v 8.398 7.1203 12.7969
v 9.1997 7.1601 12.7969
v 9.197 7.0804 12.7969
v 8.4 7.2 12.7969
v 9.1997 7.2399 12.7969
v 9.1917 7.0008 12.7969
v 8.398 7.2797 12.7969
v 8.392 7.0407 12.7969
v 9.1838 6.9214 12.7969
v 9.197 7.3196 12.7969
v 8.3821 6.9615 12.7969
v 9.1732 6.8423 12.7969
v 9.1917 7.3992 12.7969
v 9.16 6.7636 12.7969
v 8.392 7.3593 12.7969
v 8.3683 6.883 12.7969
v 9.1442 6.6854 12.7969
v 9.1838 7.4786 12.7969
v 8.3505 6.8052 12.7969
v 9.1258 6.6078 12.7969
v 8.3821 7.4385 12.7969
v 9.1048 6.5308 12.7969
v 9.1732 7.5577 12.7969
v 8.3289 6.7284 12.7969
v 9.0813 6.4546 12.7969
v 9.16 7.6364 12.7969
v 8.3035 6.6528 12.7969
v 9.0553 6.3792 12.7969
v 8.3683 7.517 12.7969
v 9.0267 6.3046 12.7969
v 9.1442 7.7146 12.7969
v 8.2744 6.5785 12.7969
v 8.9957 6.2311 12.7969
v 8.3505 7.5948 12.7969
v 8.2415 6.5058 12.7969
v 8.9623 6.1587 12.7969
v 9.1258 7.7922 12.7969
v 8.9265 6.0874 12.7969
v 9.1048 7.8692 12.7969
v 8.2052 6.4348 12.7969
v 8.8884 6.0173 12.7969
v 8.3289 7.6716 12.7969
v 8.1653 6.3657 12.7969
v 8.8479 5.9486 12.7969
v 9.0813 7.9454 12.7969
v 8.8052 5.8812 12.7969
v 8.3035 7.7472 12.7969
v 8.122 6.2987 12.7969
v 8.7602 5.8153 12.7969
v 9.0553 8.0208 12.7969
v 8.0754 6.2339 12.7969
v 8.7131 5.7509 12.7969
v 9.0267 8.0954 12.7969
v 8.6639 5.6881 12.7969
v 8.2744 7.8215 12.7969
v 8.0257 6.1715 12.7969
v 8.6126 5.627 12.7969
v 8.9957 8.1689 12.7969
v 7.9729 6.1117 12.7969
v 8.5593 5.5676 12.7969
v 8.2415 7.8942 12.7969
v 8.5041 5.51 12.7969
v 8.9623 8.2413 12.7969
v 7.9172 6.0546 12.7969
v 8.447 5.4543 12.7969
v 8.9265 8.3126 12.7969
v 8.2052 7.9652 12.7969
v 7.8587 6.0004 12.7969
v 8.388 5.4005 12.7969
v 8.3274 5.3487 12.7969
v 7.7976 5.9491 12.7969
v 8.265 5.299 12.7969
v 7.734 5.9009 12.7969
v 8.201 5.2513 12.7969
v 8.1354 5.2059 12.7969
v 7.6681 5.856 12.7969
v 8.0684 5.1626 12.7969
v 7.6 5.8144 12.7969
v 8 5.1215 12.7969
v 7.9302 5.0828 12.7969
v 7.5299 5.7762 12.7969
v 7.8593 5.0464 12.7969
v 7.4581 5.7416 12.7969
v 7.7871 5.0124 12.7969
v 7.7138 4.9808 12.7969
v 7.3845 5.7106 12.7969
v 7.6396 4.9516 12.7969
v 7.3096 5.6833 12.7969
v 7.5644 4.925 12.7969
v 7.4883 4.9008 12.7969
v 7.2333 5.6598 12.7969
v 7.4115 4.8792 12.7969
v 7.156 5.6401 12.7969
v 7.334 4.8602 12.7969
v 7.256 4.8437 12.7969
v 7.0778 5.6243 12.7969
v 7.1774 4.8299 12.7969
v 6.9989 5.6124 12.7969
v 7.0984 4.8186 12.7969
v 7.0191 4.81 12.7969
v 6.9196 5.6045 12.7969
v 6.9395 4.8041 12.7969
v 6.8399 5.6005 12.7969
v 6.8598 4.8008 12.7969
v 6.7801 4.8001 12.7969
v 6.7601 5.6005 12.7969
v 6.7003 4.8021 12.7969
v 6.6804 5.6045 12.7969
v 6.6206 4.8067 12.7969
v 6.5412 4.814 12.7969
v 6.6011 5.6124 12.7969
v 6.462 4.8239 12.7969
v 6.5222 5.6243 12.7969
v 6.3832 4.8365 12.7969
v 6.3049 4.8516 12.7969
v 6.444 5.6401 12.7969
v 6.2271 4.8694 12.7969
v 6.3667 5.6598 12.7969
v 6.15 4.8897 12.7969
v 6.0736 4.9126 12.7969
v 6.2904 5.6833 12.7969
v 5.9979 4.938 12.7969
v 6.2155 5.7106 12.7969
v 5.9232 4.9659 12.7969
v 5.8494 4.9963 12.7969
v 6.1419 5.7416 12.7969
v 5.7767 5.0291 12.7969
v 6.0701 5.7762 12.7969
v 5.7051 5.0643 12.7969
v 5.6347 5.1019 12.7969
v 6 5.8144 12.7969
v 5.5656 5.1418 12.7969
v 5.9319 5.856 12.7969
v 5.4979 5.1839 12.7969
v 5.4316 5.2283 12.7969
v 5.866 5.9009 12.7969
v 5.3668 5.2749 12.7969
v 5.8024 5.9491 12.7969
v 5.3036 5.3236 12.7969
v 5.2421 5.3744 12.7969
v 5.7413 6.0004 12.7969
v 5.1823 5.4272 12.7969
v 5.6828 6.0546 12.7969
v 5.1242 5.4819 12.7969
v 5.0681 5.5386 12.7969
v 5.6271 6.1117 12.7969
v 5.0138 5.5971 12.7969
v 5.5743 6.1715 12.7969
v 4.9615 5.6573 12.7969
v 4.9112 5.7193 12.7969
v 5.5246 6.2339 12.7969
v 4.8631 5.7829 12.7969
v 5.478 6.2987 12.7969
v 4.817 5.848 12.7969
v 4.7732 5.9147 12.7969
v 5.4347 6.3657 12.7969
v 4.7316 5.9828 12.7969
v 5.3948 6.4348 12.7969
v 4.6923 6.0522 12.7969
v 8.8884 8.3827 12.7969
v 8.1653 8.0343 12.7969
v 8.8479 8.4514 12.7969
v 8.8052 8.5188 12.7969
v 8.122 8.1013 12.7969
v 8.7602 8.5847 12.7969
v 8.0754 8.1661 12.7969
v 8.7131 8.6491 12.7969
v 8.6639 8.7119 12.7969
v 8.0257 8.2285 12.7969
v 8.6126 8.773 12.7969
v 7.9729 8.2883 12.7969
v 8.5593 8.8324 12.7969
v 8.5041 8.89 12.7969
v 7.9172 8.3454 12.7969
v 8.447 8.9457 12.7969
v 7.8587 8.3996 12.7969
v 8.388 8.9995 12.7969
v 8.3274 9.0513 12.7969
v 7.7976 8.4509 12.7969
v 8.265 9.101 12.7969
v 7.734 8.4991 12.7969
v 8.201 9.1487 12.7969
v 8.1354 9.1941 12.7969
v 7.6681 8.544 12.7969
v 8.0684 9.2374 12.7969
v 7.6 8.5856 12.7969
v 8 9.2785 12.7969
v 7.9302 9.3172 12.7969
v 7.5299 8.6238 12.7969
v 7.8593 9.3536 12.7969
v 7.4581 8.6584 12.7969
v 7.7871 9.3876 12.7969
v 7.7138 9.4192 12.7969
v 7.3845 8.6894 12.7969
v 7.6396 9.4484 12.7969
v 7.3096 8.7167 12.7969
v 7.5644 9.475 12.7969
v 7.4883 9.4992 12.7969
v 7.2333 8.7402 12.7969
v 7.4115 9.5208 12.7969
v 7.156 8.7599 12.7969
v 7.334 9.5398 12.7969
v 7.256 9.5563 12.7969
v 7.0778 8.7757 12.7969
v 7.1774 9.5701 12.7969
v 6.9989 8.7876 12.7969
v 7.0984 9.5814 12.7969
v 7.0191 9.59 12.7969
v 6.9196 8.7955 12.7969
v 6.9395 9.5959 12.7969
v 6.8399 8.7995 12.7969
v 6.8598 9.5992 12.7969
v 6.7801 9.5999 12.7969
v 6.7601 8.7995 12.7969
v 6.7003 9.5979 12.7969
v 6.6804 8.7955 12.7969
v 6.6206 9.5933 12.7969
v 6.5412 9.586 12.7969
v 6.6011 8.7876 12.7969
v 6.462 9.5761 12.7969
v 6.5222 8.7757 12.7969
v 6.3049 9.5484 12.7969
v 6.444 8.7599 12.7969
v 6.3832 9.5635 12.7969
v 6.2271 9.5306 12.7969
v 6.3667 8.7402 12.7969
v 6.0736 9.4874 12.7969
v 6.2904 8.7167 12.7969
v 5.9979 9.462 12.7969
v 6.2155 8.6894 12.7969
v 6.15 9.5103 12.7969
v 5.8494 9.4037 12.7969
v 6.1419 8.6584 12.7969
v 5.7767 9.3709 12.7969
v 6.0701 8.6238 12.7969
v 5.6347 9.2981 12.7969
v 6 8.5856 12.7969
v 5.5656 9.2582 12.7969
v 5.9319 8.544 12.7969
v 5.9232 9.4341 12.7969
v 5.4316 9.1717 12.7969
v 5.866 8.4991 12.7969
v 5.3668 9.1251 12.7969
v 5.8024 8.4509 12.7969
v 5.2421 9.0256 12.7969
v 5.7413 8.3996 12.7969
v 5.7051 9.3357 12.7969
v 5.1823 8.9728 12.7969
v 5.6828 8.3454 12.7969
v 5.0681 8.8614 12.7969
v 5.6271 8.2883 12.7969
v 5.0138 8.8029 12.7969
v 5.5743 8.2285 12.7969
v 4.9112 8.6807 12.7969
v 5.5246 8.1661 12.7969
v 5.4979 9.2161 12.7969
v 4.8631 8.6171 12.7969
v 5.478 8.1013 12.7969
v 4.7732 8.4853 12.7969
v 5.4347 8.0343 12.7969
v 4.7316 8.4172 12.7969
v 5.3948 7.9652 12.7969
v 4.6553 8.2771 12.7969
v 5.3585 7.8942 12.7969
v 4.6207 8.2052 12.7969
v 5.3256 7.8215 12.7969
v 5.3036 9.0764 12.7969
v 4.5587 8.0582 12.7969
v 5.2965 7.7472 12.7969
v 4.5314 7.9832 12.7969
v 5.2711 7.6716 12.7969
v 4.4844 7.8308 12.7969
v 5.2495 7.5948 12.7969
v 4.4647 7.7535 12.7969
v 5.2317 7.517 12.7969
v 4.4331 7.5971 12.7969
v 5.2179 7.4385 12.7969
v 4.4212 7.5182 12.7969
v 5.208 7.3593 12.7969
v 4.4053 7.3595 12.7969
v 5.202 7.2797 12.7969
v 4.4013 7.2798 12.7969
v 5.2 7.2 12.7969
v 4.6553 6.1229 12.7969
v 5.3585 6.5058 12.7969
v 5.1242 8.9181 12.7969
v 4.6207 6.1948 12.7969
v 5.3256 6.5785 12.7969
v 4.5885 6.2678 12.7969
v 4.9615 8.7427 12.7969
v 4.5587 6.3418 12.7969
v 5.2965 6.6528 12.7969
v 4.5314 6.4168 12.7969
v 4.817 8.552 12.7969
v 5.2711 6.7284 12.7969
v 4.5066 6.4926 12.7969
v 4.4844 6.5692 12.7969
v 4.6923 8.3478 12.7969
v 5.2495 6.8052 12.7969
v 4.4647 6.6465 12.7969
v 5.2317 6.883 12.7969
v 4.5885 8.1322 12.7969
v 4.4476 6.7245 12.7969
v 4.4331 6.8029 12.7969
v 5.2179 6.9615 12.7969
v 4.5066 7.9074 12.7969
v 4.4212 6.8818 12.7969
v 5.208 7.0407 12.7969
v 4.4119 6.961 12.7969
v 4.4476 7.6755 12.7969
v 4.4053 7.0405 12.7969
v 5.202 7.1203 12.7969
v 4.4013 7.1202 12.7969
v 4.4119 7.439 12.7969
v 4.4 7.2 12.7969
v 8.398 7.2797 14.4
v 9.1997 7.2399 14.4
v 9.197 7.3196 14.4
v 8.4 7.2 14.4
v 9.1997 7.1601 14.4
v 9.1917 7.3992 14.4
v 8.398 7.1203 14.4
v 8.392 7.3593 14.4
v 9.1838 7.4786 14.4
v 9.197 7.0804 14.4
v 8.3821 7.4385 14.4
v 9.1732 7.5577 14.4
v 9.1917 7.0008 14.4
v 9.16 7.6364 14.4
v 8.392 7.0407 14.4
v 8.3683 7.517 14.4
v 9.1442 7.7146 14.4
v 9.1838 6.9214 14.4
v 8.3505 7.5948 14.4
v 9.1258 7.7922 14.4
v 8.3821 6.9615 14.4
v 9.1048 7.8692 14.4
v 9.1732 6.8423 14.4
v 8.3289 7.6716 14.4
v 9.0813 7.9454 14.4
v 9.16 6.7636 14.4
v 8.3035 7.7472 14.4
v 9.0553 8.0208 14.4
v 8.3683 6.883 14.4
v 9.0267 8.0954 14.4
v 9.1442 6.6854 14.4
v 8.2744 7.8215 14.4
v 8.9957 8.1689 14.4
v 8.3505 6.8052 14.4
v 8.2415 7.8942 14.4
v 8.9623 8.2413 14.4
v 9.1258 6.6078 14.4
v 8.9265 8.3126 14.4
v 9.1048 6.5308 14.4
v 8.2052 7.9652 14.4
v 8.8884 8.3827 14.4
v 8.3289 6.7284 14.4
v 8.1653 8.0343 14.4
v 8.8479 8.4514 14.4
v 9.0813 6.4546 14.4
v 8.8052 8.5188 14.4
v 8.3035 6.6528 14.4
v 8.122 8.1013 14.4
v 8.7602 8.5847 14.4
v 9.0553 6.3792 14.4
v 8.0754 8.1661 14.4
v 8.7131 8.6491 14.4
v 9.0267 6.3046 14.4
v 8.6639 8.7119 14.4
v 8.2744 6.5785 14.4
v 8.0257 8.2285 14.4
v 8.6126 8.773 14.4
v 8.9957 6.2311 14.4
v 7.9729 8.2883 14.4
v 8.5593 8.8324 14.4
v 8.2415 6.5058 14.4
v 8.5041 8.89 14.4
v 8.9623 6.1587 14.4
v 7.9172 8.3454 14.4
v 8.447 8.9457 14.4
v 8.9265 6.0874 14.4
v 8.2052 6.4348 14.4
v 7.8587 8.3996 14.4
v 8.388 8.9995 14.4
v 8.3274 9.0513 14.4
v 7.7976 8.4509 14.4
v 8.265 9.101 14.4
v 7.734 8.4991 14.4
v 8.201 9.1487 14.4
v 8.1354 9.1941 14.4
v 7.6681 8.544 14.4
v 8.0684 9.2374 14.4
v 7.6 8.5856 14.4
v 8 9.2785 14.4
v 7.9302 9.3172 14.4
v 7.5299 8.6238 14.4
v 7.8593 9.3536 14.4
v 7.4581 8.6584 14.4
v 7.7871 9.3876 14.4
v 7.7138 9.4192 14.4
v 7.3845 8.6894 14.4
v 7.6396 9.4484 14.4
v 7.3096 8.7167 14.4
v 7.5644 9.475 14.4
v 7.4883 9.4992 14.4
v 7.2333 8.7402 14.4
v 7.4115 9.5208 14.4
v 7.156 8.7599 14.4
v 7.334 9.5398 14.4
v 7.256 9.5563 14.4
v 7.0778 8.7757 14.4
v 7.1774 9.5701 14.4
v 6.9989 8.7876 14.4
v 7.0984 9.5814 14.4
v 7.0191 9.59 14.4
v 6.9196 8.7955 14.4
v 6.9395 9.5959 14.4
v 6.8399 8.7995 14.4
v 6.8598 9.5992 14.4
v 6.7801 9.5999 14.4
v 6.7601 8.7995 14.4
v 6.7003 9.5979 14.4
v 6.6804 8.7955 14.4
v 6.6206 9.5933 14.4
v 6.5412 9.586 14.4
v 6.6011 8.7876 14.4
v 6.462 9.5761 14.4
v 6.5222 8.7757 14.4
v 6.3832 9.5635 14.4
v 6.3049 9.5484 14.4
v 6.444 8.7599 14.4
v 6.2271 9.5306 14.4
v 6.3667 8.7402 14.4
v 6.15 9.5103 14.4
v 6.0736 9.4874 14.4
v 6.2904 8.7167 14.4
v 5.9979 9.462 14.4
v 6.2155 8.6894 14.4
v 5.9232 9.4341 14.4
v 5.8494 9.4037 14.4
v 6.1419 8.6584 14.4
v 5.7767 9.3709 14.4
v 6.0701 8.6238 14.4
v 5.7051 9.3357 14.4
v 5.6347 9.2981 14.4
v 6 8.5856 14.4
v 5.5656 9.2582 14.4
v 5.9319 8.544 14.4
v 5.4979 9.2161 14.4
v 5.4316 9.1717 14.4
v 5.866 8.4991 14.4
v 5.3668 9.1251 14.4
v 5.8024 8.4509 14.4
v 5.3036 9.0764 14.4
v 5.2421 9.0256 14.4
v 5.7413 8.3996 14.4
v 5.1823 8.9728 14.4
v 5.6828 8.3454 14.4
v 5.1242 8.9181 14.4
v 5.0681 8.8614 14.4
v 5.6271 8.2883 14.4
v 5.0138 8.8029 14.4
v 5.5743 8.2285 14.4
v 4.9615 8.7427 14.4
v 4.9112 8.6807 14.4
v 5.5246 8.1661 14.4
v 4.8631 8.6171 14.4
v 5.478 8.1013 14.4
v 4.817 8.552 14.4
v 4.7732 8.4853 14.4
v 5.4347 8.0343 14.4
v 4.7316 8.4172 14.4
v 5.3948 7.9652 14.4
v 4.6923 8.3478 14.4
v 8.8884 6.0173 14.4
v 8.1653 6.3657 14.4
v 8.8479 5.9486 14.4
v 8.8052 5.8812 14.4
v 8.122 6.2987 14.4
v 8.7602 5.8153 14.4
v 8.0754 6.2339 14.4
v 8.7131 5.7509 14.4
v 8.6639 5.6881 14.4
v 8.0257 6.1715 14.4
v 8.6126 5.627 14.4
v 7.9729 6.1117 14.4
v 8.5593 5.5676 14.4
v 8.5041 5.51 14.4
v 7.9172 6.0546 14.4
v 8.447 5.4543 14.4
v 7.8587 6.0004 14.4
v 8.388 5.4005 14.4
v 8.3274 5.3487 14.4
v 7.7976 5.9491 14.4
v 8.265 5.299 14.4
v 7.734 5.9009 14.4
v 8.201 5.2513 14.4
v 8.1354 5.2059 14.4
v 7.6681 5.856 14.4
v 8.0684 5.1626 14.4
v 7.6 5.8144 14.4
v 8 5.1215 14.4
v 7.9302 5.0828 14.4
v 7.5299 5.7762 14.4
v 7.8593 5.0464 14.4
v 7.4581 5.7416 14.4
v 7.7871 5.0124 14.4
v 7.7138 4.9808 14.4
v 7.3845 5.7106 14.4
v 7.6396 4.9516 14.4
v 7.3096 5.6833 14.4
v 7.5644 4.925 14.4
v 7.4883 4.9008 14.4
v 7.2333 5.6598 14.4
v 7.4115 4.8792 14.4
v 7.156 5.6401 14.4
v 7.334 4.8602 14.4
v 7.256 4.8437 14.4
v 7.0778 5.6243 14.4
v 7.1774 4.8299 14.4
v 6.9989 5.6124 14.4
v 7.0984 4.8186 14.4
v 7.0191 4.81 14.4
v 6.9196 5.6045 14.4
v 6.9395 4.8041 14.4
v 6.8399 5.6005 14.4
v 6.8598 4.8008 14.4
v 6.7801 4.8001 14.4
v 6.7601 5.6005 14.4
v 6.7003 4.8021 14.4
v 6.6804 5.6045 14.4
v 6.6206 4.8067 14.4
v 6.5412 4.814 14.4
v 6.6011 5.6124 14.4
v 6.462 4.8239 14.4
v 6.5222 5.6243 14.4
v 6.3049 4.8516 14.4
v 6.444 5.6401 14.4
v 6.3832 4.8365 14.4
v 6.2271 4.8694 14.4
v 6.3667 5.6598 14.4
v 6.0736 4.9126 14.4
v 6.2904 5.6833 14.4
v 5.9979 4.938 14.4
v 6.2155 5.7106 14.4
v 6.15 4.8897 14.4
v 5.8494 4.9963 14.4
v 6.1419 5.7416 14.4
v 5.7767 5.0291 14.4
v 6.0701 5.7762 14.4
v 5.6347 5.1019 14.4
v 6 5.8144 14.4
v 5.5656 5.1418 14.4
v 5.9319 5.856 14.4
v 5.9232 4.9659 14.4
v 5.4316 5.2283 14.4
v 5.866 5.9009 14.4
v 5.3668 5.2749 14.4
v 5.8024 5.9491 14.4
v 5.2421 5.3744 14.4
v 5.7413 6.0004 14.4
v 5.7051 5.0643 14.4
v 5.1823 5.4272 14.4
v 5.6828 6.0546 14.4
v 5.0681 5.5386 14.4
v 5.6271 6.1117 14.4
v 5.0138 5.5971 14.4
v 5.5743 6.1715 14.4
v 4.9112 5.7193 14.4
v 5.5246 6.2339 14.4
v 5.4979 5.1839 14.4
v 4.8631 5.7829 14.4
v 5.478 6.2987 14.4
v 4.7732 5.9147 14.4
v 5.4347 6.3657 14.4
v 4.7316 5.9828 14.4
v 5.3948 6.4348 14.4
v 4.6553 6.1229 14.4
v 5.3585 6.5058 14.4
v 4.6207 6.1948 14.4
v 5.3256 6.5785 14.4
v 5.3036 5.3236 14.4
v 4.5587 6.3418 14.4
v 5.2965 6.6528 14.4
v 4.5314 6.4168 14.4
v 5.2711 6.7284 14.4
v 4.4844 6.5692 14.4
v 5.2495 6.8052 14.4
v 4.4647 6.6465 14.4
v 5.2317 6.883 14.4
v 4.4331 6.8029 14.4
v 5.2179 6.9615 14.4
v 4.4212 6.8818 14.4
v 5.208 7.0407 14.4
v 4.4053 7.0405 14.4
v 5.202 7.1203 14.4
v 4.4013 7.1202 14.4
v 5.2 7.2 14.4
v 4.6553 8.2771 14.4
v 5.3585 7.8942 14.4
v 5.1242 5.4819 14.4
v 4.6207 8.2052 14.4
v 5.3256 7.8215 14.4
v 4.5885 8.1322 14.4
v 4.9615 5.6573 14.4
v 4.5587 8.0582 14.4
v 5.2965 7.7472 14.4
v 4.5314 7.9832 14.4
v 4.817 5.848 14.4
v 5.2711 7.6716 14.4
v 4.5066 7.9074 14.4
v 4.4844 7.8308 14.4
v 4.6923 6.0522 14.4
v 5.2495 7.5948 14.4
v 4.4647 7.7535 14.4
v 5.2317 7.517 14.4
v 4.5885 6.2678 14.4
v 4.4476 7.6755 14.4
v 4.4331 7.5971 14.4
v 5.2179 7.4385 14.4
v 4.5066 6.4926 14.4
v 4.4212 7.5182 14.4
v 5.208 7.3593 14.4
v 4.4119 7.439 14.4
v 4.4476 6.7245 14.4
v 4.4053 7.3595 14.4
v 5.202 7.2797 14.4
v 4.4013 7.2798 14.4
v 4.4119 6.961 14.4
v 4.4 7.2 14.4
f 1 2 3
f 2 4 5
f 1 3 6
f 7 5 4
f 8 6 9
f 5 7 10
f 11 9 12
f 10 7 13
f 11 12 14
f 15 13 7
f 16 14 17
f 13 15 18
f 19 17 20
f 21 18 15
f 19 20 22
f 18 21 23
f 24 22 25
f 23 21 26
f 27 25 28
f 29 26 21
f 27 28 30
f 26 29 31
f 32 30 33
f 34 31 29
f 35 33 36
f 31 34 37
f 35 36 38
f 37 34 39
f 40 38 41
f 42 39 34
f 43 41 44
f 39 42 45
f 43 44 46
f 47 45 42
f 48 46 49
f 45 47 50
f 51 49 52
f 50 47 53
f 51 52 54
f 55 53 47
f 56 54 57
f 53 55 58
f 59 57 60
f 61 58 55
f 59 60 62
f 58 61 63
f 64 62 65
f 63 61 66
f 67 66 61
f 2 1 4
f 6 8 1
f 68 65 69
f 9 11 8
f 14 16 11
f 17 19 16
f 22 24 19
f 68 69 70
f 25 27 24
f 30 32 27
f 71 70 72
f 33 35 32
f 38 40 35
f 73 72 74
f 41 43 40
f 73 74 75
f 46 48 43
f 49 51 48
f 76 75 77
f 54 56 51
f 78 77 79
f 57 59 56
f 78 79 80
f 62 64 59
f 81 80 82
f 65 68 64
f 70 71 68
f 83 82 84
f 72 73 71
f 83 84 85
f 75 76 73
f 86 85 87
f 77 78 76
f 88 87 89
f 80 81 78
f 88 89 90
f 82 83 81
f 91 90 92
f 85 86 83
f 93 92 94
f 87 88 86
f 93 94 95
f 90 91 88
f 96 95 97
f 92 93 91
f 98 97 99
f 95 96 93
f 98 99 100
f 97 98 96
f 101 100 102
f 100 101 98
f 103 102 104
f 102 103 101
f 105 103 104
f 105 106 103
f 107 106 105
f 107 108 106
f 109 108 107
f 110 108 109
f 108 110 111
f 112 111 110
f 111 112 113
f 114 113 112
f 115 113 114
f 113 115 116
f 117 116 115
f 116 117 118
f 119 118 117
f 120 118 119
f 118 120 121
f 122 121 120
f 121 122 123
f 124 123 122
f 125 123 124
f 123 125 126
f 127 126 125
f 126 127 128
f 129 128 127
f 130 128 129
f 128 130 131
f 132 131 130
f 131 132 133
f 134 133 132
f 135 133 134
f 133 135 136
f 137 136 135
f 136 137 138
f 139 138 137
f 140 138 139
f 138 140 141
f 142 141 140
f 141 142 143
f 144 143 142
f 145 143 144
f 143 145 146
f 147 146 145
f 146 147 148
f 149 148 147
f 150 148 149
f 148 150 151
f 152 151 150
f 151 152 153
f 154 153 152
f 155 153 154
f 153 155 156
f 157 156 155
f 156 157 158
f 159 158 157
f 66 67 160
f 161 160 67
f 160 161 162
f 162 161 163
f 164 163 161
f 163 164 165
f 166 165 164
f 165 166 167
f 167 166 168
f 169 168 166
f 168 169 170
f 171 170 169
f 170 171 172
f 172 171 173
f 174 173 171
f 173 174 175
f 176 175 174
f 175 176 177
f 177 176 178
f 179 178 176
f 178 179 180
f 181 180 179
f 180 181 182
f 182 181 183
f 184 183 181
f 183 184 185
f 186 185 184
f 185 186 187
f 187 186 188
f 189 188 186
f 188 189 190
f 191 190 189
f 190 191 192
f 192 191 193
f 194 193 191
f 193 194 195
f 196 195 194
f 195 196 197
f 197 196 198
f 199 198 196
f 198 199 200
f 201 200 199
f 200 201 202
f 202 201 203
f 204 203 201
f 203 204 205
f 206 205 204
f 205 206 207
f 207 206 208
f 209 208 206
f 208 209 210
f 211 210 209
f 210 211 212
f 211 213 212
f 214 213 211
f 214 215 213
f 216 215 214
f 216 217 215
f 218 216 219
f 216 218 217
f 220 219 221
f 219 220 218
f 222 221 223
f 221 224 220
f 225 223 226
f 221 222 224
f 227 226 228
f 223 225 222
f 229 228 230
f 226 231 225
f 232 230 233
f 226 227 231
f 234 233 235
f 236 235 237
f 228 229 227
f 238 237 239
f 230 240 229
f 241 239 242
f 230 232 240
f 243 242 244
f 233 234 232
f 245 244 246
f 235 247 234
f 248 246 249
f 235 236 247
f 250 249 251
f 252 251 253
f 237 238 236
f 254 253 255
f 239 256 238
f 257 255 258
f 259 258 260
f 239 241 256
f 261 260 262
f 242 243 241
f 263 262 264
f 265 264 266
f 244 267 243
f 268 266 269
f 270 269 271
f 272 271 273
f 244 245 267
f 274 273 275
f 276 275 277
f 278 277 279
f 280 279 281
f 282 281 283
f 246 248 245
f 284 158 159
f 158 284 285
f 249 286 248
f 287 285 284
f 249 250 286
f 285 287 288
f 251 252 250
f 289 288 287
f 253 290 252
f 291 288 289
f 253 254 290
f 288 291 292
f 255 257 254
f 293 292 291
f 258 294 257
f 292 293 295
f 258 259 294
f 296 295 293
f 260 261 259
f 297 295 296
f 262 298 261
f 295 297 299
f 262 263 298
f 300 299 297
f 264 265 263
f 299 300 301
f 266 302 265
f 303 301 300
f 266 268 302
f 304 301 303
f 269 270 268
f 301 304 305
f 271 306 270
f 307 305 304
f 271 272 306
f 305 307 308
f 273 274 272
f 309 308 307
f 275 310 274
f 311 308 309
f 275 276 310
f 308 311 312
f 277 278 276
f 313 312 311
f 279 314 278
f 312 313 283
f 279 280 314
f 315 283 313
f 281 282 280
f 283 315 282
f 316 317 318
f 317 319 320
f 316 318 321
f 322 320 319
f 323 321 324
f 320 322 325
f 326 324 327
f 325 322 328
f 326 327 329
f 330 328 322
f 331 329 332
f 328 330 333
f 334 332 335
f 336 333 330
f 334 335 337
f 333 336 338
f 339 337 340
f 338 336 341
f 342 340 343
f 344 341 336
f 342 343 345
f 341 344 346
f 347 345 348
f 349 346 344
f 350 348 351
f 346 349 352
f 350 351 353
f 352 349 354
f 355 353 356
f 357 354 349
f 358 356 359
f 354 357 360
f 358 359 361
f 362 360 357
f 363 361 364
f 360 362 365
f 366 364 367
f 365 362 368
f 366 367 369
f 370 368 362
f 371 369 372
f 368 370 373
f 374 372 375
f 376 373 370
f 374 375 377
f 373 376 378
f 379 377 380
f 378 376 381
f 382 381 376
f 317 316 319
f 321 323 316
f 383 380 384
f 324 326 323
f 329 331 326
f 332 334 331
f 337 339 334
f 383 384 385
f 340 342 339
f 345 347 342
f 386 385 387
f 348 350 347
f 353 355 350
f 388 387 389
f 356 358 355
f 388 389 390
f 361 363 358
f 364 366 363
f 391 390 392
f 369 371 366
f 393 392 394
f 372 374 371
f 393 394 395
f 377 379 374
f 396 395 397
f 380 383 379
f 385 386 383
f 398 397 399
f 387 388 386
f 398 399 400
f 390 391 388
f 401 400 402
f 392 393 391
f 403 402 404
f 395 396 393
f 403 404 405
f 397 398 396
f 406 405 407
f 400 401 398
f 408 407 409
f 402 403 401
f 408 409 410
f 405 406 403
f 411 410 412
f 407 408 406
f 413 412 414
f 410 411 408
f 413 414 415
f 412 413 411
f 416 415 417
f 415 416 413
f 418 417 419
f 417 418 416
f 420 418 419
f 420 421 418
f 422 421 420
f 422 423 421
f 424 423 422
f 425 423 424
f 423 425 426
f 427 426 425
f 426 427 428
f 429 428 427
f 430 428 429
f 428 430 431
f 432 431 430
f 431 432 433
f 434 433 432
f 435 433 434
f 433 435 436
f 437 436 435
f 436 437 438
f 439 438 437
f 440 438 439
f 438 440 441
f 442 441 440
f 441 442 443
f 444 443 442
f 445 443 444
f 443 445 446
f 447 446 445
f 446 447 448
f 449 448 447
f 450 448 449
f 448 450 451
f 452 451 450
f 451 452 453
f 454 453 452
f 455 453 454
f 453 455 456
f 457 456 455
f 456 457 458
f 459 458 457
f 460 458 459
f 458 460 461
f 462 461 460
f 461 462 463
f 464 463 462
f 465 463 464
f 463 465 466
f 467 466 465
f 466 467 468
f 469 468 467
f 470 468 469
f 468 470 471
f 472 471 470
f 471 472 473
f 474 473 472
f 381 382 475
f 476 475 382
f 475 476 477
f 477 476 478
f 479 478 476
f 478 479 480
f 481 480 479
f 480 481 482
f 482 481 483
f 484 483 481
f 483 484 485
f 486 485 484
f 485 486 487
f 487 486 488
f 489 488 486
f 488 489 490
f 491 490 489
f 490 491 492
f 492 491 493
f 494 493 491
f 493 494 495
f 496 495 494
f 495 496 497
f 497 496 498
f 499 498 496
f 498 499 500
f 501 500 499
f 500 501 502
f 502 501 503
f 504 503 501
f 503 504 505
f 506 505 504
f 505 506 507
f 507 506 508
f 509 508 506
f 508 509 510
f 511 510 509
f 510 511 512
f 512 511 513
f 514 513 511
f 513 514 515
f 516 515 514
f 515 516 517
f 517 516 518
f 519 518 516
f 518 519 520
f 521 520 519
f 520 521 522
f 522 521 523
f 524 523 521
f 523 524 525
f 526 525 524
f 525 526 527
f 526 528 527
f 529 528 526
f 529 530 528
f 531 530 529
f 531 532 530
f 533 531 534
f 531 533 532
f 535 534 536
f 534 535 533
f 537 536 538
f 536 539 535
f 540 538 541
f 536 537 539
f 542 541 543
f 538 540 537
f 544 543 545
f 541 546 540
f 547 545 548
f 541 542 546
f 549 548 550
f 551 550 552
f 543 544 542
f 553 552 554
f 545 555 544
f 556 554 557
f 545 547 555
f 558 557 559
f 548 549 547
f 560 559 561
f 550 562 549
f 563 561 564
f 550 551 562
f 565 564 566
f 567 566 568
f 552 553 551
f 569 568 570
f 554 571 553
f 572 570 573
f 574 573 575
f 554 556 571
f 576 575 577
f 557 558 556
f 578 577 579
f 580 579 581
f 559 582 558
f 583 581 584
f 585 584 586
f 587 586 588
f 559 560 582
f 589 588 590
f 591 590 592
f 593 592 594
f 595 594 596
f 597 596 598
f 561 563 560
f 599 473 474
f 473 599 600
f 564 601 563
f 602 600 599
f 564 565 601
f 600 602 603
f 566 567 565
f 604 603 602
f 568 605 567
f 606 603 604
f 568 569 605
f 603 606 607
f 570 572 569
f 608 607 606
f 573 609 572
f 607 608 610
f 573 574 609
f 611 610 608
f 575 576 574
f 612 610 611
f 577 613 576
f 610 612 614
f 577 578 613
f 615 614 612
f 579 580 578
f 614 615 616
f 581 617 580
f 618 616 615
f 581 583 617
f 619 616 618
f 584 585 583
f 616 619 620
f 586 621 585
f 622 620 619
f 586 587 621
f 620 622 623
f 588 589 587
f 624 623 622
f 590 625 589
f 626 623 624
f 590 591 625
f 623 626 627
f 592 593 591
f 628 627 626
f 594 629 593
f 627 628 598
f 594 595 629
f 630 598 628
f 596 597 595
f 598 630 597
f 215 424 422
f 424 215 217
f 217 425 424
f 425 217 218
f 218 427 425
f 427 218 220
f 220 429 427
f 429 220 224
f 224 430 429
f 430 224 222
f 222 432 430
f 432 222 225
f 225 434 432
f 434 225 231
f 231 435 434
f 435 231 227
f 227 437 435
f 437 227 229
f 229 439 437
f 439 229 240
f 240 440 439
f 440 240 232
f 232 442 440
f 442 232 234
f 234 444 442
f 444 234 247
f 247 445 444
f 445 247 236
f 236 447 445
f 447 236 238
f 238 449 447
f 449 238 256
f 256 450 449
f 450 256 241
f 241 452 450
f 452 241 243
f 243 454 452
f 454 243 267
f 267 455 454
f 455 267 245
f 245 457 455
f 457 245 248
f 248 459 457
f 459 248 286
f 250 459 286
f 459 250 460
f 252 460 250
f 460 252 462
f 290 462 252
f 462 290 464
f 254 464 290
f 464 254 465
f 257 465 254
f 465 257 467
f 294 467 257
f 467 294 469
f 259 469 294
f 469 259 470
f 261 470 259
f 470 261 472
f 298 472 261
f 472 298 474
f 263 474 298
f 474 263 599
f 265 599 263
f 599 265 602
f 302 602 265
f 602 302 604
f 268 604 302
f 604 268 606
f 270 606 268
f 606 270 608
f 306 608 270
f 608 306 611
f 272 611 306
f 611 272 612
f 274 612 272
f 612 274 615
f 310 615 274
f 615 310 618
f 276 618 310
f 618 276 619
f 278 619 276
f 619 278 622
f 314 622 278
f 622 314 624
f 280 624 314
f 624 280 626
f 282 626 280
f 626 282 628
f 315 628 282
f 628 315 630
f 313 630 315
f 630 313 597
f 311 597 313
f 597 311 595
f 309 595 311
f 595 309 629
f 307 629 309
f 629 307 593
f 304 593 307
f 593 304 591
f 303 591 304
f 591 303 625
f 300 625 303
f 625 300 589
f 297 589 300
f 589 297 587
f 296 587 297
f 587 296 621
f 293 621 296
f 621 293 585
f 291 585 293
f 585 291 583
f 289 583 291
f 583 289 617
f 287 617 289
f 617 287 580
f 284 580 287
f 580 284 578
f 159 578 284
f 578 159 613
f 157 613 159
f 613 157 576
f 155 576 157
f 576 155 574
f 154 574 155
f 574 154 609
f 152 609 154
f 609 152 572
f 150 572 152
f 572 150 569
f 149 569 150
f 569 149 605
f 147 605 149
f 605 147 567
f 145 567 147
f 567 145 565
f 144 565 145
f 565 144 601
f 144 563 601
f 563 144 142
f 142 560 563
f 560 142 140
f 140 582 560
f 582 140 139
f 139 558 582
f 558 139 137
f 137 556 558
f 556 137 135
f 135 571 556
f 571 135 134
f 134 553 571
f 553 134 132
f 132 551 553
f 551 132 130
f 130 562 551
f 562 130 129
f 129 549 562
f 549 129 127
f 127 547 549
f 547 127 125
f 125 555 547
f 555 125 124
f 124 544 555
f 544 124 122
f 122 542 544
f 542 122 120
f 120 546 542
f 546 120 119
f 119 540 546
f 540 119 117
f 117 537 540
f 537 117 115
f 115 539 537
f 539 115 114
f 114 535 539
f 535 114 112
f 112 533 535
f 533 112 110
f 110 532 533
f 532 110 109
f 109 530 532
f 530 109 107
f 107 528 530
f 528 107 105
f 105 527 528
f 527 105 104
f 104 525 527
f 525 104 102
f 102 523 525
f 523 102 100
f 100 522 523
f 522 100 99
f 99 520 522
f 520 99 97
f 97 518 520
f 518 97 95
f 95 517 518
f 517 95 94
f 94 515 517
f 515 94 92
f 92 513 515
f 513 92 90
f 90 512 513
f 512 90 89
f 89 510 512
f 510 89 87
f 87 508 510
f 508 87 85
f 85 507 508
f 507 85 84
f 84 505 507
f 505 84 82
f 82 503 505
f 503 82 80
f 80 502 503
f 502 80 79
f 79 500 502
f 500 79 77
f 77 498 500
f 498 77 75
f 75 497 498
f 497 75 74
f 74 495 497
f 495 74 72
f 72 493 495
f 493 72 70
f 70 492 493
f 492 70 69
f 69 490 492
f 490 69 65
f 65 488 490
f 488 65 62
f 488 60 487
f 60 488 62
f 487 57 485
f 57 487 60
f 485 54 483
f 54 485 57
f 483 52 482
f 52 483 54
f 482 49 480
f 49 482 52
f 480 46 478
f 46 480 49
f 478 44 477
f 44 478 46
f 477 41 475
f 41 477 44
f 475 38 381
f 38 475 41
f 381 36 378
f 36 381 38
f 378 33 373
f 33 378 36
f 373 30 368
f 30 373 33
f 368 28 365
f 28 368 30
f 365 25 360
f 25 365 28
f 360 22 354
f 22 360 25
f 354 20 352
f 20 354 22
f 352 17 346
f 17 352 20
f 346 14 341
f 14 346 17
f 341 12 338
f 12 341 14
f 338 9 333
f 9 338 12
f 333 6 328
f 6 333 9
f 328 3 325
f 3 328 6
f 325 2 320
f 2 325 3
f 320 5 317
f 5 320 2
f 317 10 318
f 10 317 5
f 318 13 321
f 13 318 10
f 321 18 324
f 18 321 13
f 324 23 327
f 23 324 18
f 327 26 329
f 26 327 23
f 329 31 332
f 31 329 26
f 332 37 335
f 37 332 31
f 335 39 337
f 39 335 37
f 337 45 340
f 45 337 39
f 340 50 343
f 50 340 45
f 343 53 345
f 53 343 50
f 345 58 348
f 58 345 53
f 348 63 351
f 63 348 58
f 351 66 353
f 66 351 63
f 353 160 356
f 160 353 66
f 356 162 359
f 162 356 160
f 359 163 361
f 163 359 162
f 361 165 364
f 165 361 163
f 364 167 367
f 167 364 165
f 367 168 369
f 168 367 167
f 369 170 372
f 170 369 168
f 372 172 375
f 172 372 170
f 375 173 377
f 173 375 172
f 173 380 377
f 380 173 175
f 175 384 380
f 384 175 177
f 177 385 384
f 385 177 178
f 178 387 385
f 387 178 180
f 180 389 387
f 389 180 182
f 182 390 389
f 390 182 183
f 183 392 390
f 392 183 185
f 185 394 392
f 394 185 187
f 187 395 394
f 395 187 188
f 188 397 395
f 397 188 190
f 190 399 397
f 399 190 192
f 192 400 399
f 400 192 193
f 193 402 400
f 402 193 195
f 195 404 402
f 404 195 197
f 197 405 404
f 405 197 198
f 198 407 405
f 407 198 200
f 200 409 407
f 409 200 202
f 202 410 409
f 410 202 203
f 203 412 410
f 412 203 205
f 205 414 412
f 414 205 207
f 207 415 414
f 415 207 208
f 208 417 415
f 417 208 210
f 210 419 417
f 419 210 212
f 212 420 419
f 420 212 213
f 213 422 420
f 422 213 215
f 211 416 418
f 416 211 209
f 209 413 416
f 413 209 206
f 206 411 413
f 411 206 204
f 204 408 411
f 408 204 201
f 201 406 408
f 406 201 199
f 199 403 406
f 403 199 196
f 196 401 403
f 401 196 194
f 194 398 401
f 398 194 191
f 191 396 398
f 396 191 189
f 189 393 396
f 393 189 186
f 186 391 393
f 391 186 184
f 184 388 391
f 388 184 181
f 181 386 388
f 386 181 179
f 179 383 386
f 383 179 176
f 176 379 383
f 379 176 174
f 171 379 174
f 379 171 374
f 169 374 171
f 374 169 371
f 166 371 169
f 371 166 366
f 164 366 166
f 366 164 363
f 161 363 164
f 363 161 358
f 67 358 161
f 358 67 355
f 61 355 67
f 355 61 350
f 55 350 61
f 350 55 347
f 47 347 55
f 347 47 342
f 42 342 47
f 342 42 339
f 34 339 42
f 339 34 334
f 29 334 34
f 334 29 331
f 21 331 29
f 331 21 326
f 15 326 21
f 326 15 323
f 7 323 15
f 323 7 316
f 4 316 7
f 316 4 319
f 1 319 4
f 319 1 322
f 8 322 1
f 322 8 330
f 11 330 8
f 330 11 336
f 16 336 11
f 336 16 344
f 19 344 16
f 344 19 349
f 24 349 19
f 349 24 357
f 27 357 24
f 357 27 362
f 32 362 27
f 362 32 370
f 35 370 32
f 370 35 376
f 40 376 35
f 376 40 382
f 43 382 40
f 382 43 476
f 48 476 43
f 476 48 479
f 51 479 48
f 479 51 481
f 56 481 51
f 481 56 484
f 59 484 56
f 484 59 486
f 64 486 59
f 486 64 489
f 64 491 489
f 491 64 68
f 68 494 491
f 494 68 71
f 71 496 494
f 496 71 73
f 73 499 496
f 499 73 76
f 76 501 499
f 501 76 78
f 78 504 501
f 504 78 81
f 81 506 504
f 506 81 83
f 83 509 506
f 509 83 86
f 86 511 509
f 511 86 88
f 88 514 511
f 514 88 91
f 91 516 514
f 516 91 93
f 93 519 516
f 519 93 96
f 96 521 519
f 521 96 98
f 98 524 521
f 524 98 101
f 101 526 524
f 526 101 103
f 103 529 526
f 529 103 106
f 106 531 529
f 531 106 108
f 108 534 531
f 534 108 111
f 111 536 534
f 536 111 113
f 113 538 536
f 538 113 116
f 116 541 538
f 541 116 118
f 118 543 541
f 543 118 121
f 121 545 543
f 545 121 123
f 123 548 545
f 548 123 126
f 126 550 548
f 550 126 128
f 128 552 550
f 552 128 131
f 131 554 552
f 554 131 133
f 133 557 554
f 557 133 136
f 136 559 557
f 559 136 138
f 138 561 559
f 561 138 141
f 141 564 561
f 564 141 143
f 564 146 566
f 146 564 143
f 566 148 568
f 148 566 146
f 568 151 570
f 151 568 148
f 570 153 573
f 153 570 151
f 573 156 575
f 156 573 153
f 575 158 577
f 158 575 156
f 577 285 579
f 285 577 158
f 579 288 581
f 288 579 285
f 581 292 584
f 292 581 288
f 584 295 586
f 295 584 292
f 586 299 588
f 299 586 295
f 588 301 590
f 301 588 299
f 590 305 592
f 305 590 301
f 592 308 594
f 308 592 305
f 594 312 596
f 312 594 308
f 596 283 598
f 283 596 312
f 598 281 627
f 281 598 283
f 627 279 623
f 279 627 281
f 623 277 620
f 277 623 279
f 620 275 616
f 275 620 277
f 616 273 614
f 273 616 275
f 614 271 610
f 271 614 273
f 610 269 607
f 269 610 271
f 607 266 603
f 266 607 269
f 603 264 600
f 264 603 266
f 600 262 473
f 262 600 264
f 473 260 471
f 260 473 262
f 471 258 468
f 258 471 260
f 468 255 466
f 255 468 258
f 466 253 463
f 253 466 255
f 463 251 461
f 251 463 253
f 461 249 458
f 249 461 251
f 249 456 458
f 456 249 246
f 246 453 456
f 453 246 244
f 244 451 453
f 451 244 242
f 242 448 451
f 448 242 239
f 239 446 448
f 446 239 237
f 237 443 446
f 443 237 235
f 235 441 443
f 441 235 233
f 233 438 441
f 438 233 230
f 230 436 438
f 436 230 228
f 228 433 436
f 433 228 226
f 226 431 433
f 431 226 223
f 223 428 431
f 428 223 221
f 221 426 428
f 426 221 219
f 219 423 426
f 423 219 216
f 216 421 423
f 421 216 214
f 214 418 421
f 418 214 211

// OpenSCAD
use <../lib.scad>
use <../p/1-4cylc.scad>
use <../p/1-4ndis.scad>
use <../p/box2-5.scad>
use <../p/box2-7.scad>
use <../p/box2-9.scad>
use <../p/box3-3.scad>
use <../p/box3u4p.scad>
use <../p/box4-2p.scad>
use <../p/box4-4a.scad>
use <../p/rect.scad>
use <../p/rect1.scad>
use <../p/rect2p.scad>
use <../p/stud2.scad>
$fa=1; $fs=0.2;
function ldraw_lib__30079(realsolid=false) = [
// 0 Panel  3 x  3 x  3
// 0 Name: 30079.dat
// 0 Author: Luis E. Fernandez [lfernand]
// 0 !LDRAW_ORG Part UPDATE 2010-03
// 0 !LICENSE Licensed under CC BY 2.0 and CC BY 4.0 : see CAreadme.txt
// 
// 0 BFC CERTIFY CCW
  [0,"BFC","CERTIFY"],
  [0,"BFC","CCW"],
// 
// 0 !KEYWORDS Divers
// 
// 0 !HISTORY 1998-02-12 [PTadmin] Official Update 1998-02
// 0 !HISTORY 2007-10-12 [PTadmin] Header formatted for Contributor Agreement
// 0 !HISTORY 2008-07-01 [PTadmin] Official Update 2008-01
// 0 !HISTORY 2010-07-07 [MagFors] Completed the design, BFC'ed, used more primitives
// 0 !HISTORY 2010-12-31 [PTadmin] Official Update 2010-03
// 
// 
// 2 24 27 32 -32 27 32 -12
  [2,24,27,32,-32,27,32,-12],
// 2 24 -13 32 28 -33 32 28
  [2,24,-13,32,28,-33,32,28],
// 2 24 -33 32 8 -27.2426 32 2.2426
  [2,24,-33,32,8,-27.2426,32,2.2426],
// 2 24 -27.2426 32 2.2426 -24.2426 32 5.2426
  [2,24,-27.2426,32,2.2426,-24.2426,32,5.2426],
// 2 24 -24.2426 32 5.2426 -29 32 10
  [2,24,-24.2426,32,5.2426,-29,32,10],
// 2 24 9 32 -28 4.2426 32 -23.2426
  [2,24,9,32,-28,4.2426,32,-23.2426],
// 2 24 4.2426 32 -23.2426 1.2426 32 -26.2426
  [2,24,4.2426,32,-23.2426,1.2426,32,-26.2426],
// 2 24 1.2426 32 -26.2426 7 32 -32
  [2,24,1.2426,32,-26.2426,7,32,-32],
// 2 24 -7.2426 32 -17.7574 -4.2426 32 -14.7574
  [2,24,-7.2426,32,-17.7574,-4.2426,32,-14.7574],
// 2 24 -15.7574 32 -3.2426 -18.7574 32 -6.2426
  [2,24,-15.7574,32,-3.2426,-18.7574,32,-6.2426],
// 0 // bottom surface
// 4 16 27 32 -32 23 32 -28 23 32 -16 27 32 -12
  [4,16,27,32,-32,23,32,-28,23,32,-16,27,32,-12],
// 4 16 27 32 -12 23 32 -16 11 32 -16 7 32 -12
  [4,16,27,32,-12,23,32,-16,11,32,-16,7,32,-12],
// 3 16 9 32 -16 7 32 -12 11 32 -16
  [3,16,9,32,-16,7,32,-12,11,32,-16],
// 3 16 7 32 -16 7 32 -12 9 32 -16
  [3,16,7,32,-16,7,32,-12,9,32,-16],
// 4 16 3 32 -12 -2 32 -10 3 32 -10 7 32 -12
  [4,16,3,32,-12,-2,32,-10,3,32,-10,7,32,-12],
// 4 16 7 32 -12 3 32 -10 3 32 4 7 32 8
  [4,16,7,32,-12,3,32,-10,3,32,4,7,32,8],
// 4 16 7 32 8 3 32 4 -11 32 4 -13 32 8
  [4,16,7,32,8,3,32,4,-11,32,4,-13,32,8],
// 4 16 -13 32 4 -13 32 8 -11 32 4 -11 32 -1
  [4,16,-13,32,4,-13,32,8,-11,32,4,-11,32,-1],
// 3 16 -13 32 8 -17 32 8 -17 32 10
  [3,16,-13,32,8,-17,32,8,-17,32,10],
// 3 16 -13 32 8 -17 32 10 -17 32 12
  [3,16,-13,32,8,-17,32,10,-17,32,12],
// 4 16 -13 32 8 -17 32 12 -17 32 24 -13 32 28
  [4,16,-13,32,8,-17,32,12,-17,32,24,-13,32,28],
// 4 16 -13 32 28 -17 32 24 -29 32 24 -33 32 28
  [4,16,-13,32,28,-17,32,24,-29,32,24,-33,32,28],
// 4 16 -33 32 28 -29 32 24 -29 32 12 -33 32 8
  [4,16,-33,32,28,-29,32,24,-29,32,12,-33,32,8],
// 3 16 -33 32 8 -29 32 12 -29 32 10
  [3,16,-33,32,8,-29,32,12,-29,32,10],
// 4 16 -33 32 8 -29 32 10 -24.2426 32 5.2426 -27.2426 32 2.2426
  [4,16,-33,32,8,-29,32,10,-24.2426,32,5.2426,-27.2426,32,2.2426],
// 3 16 -18.7574 32 -6.2426 -15.7574 32 -3.2426 -13 32 -6
  [3,16,-18.7574,32,-6.2426,-15.7574,32,-3.2426,-13,32,-6],
// 3 16 -18.7574 32 -6.2426 -13 32 -6 -11 32 -8
  [3,16,-18.7574,32,-6.2426,-13,32,-6,-11,32,-8],
// 4 16 -18.7574 32 -6.2426 -11 32 -8 -9 32 -10 -7.2426 32 -17.7574
  [4,16,-18.7574,32,-6.2426,-11,32,-8,-9,32,-10,-7.2426,32,-17.7574],
// 3 16 -7.2426 32 -17.7574 -9 32 -10 -7 32 -12
  [3,16,-7.2426,32,-17.7574,-9,32,-10,-7,32,-12],
// 3 16 -7.2426 32 -17.7574 -7 32 -12 -4.2426 32 -14.7574
  [3,16,-7.2426,32,-17.7574,-7,32,-12,-4.2426,32,-14.7574],
// 4 16 1.2426 32 -26.2426 4.2426 32 -23.2426 9 32 -28 7 32 -32
  [4,16,1.2426,32,-26.2426,4.2426,32,-23.2426,9,32,-28,7,32,-32],
// 3 16 7 32 -32 9 32 -28 11 32 -28
  [3,16,7,32,-32,9,32,-28,11,32,-28],
// 4 16 7 32 -32 11 32 -28 23 32 -28 27 32 -32
  [4,16,7,32,-32,11,32,-28,23,32,-28,27,32,-32],
// 0 //
// 0 BFC INVERTNEXT
  [0,"BFC","INVERTNEXT"],
// 1 16 17 32 -22 0 0 6 0 -4 0 6 0 0 box4-4a.dat
  [1,16,17,32,-22,0,0,6,0,-4,0,6,0,0, ldraw_lib__box4_4a(realsolid)],
// 1 16 10 28 -22 0 0 1 0 4 0 -6 0 0 box3u4p.dat
  [1,16,10,28,-22,0,0,1,0,4,0,-6,0,0, ldraw_lib__box3u4p(realsolid)],
// 3 16 -7 32 -12 -9 32 -10 -4 32 -10
  [3,16,-7,32,-12,-9,32,-10,-4,32,-10],
// 4 16 3 32 -12 -7 32 -12 -4 32 -10 -2 32 -10
  [4,16,3,32,-12,-7,32,-12,-4,32,-10,-2,32,-10],
// 1 16 -3 30 -10 -1 0 0 0 0 2 0 2 0 box4-2p.dat
  [1,16,-3,30,-10,-1,0,0,0,0,2,0,2,0, ldraw_lib__box4_2p(realsolid)],
// 0 BFC INVERTNEXT
  [0,"BFC","INVERTNEXT"],
// 1 16 0.5 30 -3 0 2.5 0 2 0 0 0 0 -7 box2-7.dat
  [1,16,0.5,30,-3,0,2.5,0,2,0,0,0,0,-7, ldraw_lib__box2_7(realsolid)],
// 1 16 -6.5 30 -10 0 0 -2.5 2 0 0 0 -1 0 rect.dat
  [1,16,-6.5,30,-10,0,0,-2.5,2,0,0,0,-1,0, ldraw_lib__rect(realsolid)],
// 1 16 8 30 -16 1 0 0 0 0 -2 0 1 0 rect2p.dat
  [1,16,8,30,-16,1,0,0,0,0,-2,0,1,0, ldraw_lib__rect2p(realsolid)],
// 1 16 7 32 -12 -4 0 0 0 -4 0 0 0 -4 1-4cylc.dat
  [1,16,7,32,-12,-4,0,0,0,-4,0,0,0,-4, ldraw_lib__1_4cylc(realsolid)],
// 0 BFC INVERTNEXT
  [0,"BFC","INVERTNEXT"],
// 1 16 -0.6213 30 -13.3787 0 -5 -1.3787 2 0 0 0 0 1.3787 box2-5.dat
  [1,16,-0.6213,30,-13.3787,0,-5,-1.3787,2,0,0,0,0,1.3787, ldraw_lib__box2_5(realsolid)],
// 2 24 3 28 4 3 32 4
  [2,24,3,28,4,3,32,4],
// 1 16 -10 30 -9 -1 0 0 0 0 -2 1 -1 0 rect2p.dat
  [1,16,-10,30,-9,-1,0,0,0,0,-2,1,-1,0, ldraw_lib__rect2p(realsolid)],
// 0 BFC INVERTNEXT
  [0,"BFC","INVERTNEXT"],
// 1 16 -23 32 18 -6 0 0 0 -4 0 0 0 6 box4-4a.dat
  [1,16,-23,32,18,-6,0,0,0,-4,0,0,0,6, ldraw_lib__box4_4a(realsolid)],
// 1 16 -23 28 11 -6 0 0 0 4 0 0 0 -1 box3u4p.dat
  [1,16,-23,28,11,-6,0,0,0,4,0,0,0,-1, ldraw_lib__box3u4p(realsolid)],
// 3 16 -11 32 -3 -11 32 -8 -13 32 -6
  [3,16,-11,32,-3,-11,32,-8,-13,32,-6],
// 4 16 -11 32 -1 -11 32 -3 -13 32 -6 -13 32 4
  [4,16,-11,32,-1,-11,32,-3,-13,32,-6,-13,32,4],
// 1 16 -11 30 -2 0 2 0 0 0 2 1 0 0 box4-2p.dat
  [1,16,-11,30,-2,0,2,0,0,0,2,1,0,0, ldraw_lib__box4_2p(realsolid)],
// 0 BFC INVERTNEXT
  [0,"BFC","INVERTNEXT"],
// 1 16 -4 30 1.5 0 -7 0 2 0 0 0 0 2.5 box2-7.dat
  [1,16,-4,30,1.5,0,-7,0,2,0,0,0,0,2.5, ldraw_lib__box2_7(realsolid)],
// 1 16 -11 30 -5.5 0 -1 0 0 0 2 2.5 0 0 rect.dat
  [1,16,-11,30,-5.5,0,-1,0,0,0,2,2.5,0,0, ldraw_lib__rect(realsolid)],
// 1 16 -17 30 9 0 1 0 0 0 -2 -1 0 0 rect2p.dat
  [1,16,-17,30,9,0,1,0,0,0,-2,-1,0,0, ldraw_lib__rect2p(realsolid)],
// 1 16 -13 32 8 -4 0 0 0 -4 0 0 0 -4 1-4cylc.dat
  [1,16,-13,32,8,-4,0,0,0,-4,0,0,0,-4, ldraw_lib__1_4cylc(realsolid)],
// 0 BFC INVERTNEXT
  [0,"BFC","INVERTNEXT"],
// 1 16 -14.3787 30 0.3787 0 0 1.3787 -2 0 0 0 -5 -1.3787 box2-5.dat
  [1,16,-14.3787,30,0.3787,0,0,1.3787,-2,0,0,0,-5,-1.3787, ldraw_lib__box2_5(realsolid)],
// 2 24 1.2426 28 -26.2426 1.2426 32 -26.2426
  [2,24,1.2426,28,-26.2426,1.2426,32,-26.2426],
// 2 24 -27.2426 28 2.2426 -27.2426 32 2.2426
  [2,24,-27.2426,28,2.2426,-27.2426,32,2.2426],
// 1 16 5.121 30 -27.121 0 1.5 -2.37871 -2 0 0 0 1.5 2.37871 box2-9.dat
  [1,16,5.121,30,-27.121,0,1.5,-2.37871,-2,0,0,0,1.5,2.37871, ldraw_lib__box2_9(realsolid)],
// 0 BFC INVERTNEXT
  [0,"BFC","INVERTNEXT"],
// 1 16 -1.5 30 -20.5 -1.5 0 -4.24264 0 -2 0 -1.5 0 4.24264 box2-9.dat
  [1,16,-1.5,30,-20.5,-1.5,0,-4.24264,0,-2,0,-1.5,0,4.24264, ldraw_lib__box2_9(realsolid)],
// 1 16 -28.121 30 6.121 0 1.5 2.37871 -2 0 0 0 1.5 -2.37871 box2-9.dat
  [1,16,-28.121,30,6.121,0,1.5,2.37871,-2,0,0,0,1.5,-2.37871, ldraw_lib__box2_9(realsolid)],
// 0 BFC INVERTNEXT
  [0,"BFC","INVERTNEXT"],
// 1 16 -21.5 30 -0.5 -1.5 0 4.24264 0 -2 0 -1.5 0 -4.24264 box2-9.dat
  [1,16,-21.5,30,-0.5,-1.5,0,4.24264,0,-2,0,-1.5,0,-4.24264, ldraw_lib__box2_9(realsolid)],
// 0 //
// 1 16 7 28 -12 -4 0 0 0 -1 0 0 0 -4 1-4ndis.dat
  [1,16,7,28,-12,-4,0,0,0,-1,0,0,0,-4, ldraw_lib__1_4ndis(realsolid)],
// 1 16 -13 28 8 -4 0 0 0 -1 0 0 0 -4 1-4ndis.dat
  [1,16,-13,28,8,-4,0,0,0,-1,0,0,0,-4, ldraw_lib__1_4ndis(realsolid)],
// 4 16 9 28 -16 9 28 -28 4.24264 28 -23.24264 3 28 -16
  [4,16,9,28,-16,9,28,-28,4.24264,28,-23.24264,3,28,-16],
// 3 16 -4.2426 28 -14.7574 3 28 -16 4.2426 28 -23.2426
  [3,16,-4.2426,28,-14.7574,3,28,-16,4.2426,28,-23.2426],
// 4 16 -24.2426 28 5.2426 -29 28 10 -17 28 10 -17 28 4
  [4,16,-24.2426,28,5.2426,-29,28,10,-17,28,10,-17,28,4],
// 3 16 -24.2426 28 5.2426 -17 28 4 -15.7574 28 -3.2426
  [3,16,-24.2426,28,5.2426,-17,28,4,-15.7574,28,-3.2426],
// 4 16 -15.7574 28 -3.2426 -17 28 4 3 28 -16 -4.2426 28 -14.7574
  [4,16,-15.7574,28,-3.2426,-17,28,4,3,28,-16,-4.2426,28,-14.7574],
// 3 16 -17 28 4 3 28 4 3 28 -16
  [3,16,-17,28,4,3,28,4,3,28,-16],
// 0 //
// 2 24 -13 24 28 -13 32 28
  [2,24,-13,24,28,-13,32,28],
// 4 16 27 32 -32 27 32 -12 27 24 -12 27 24 -28
  [4,16,27,32,-32,27,32,-12,27,24,-12,27,24,-28],
// 0 BFC INVERTNEXT
  [0,"BFC","INVERTNEXT"],
// 1 16 17 28 -2 0 0 -10 4 0 0 0 -10 0 box2-5.dat
  [1,16,17,28,-2,0,0,-10,4,0,0,0,-10,0, ldraw_lib__box2_5(realsolid)],
// 0 BFC INVERTNEXT
  [0,"BFC","INVERTNEXT"],
// 1 16 -3 28 18 0 0 -10 4 0 0 0 -10 0 box2-7.dat
  [1,16,-3,28,18,0,0,-10,4,0,0,0,-10,0, ldraw_lib__box2_7(realsolid)],
// 4 16 -13 32 28 -33 32 28 -29 24 28 -13 24 28
  [4,16,-13,32,28,-33,32,28,-29,24,28,-13,24,28],
// 0 //
// 1 16 17 24 -20 10 0 0 0 1 0 0 0 8 rect1.dat
  [1,16,17,24,-20,10,0,0,0,1,0,0,0,8, ldraw_lib__rect1(realsolid)],
// 1 16 -21 24 18 0 0 -8 0 1 0 10 0 0 rect1.dat
  [1,16,-21,24,18,0,0,-8,0,1,0,10,0,0, ldraw_lib__rect1(realsolid)],
// 3 16 7 24 -12 7 24 8 -13 24 8
  [3,16,7,24,-12,7,24,8,-13,24,8],
// 4 16 7 24 -12 -13 24 8 -29 24 8 7 24 -28
  [4,16,7,24,-12,-13,24,8,-29,24,8,7,24,-28],
// 0 //
// 0 BFC INVERTNEXT
  [0,"BFC","INVERTNEXT"],
// 1 16 -14 -2 18 0 -15 0 0 16 -10 10 0 0 box2-5.dat
  [1,16,-14,-2,18,0,-15,0,0,16,-10,10,0,0, ldraw_lib__box2_5(realsolid)],
// 1 16 -11 14 -10 -18 0 0 0 0 -10 18 -1 0 rect2p.dat
  [1,16,-11,14,-10,-18,0,0,0,0,-10,18,-1,0, ldraw_lib__rect2p(realsolid)],
// 2 24 7 -28 2 1 -28 8
  [2,24,7,-28,2,1,-28,8],
// 2 24 1 -28 28 27 -28 28
  [2,24,1,-28,28,27,-28,28],
// 2 24 27 -28 28 27 -28 2
  [2,24,27,-28,28,27,-28,2],
// 4 16 27 -28 2 7 -28 2 1 -28 8 1 -28 28
  [4,16,27,-28,2,7,-28,2,1,-28,8,1,-28,28],
// 3 16 1 -28 28 27 -28 28 27 -28 2
  [3,16,1,-28,28,27,-28,28,27,-28,2],
// 4 16 -29 4 8 1 -28 8 7 -28 2 7 4 -28
  [4,16,-29,4,8,1,-28,8,7,-28,2,7,4,-28],
// 0 BFC INVERTNEXT
  [0,"BFC","INVERTNEXT"],
// 1 16 17 -2 -13 -10 0 0 0 16 -10 0 -15 0 box2-5.dat
  [1,16,17,-2,-13,-10,0,0,0,16,-10,0,-15,0, ldraw_lib__box2_5(realsolid)],
// 0 //
// 2 24 27 -32 28 27 -28 28
  [2,24,27,-32,28,27,-28,28],
// 4 16 27 32 -32 27 24 -28 27 4 -28 27 2 -32
  [4,16,27,32,-32,27,24,-28,27,4,-28,27,2,-32],
// 4 16 27 2 -32 27 4 -28 27 -28 2 27 -40 8
  [4,16,27,2,-32,27,4,-28,27,-28,2,27,-40,8],
// 3 16 27 -40 8 27 -28 2 27 -32 8
  [3,16,27,-40,8,27,-28,2,27,-32,8],
// 4 16 27 -32 8 27 -28 2 27 -28 28 27 -32 28
  [4,16,27,-32,8,27,-28,2,27,-28,28,27,-32,28],
// 4 16 -33 2 28 -29 4 28 -29 24 28 -33 32 28
  [4,16,-33,2,28,-29,4,28,-29,24,28,-33,32,28],
// 4 16 7 -40 28 1 -28 28 -29 4 28 -33 2 28
  [4,16,7,-40,28,1,-28,28,-29,4,28,-33,2,28],
// 3 16 7 -32 28 1 -28 28 7 -40 28
  [3,16,7,-32,28,1,-28,28,7,-40,28],
// 4 16 27 -32 28 27 -28 28 1 -28 28 7 -32 28
  [4,16,27,-32,28,27,-28,28,1,-28,28,7,-32,28],
// 4 16 1.2426 28 -26.2426 1.2426 32 -26.2426 7 32 -32 7 2 -32
  [4,16,1.2426,28,-26.2426,1.2426,32,-26.2426,7,32,-32,7,2,-32],
// 3 16 1.2426 28 -26.2426 7 2 -32 -7.2426 28 -17.7574
  [3,16,1.2426,28,-26.2426,7,2,-32,-7.2426,28,-17.7574],
// 4 16 -33 2 8 -33 32 8 -27.2426 32 2.2426 -27.2426 28 2.2426
  [4,16,-33,2,8,-33,32,8,-27.2426,32,2.2426,-27.2426,28,2.2426],
// 3 16 -33 2 8 -27.2426 28 2.2426 -18.7574 28 -6.2426
  [3,16,-33,2,8,-27.2426,28,2.2426,-18.7574,28,-6.2426],
// 1 16 -13 30 -12 0 0 5.7574 2 0 0 0 1 -5.7574 rect1.dat
  [1,16,-13,30,-12,0,0,5.7574,2,0,0,0,1,-5.7574, ldraw_lib__rect1(realsolid)],
// 4 16 -33 2 8 -18.7574 28 -6.2426 -7.2426 28 -17.7574 7 2 -32
  [4,16,-33,2,8,-18.7574,28,-6.2426,-7.2426,28,-17.7574,7,2,-32],
// 2 24 7 2 -32 -33 2 8
  [2,24,7,2,-32,-33,2,8],
// 3 16 7 2 -32 7 -40 8 -33 2 8
  [3,16,7,2,-32,7,-40,8,-33,2,8],
// 0 BFC INVERTNEXT
  [0,"BFC","INVERTNEXT"],
// 1 16 17 -36 18 -10 0 0 0 4 0 0 0 -10 box3-3.dat
  [1,16,17,-36,18,-10,0,0,0,4,0,0,0,-10, ldraw_lib__box3_3(realsolid)],
// 1 16 17 -4 -12 -10 0 0 0 21 -15 0 -20 0 box2-5.dat
  [1,16,17,-4,-12,-10,0,0,0,21,-15,0,-20,0, ldraw_lib__box2_5(realsolid)],
// 1 16 -13 -4 18 0 -20 0 0 21 -15 10 0 0 box2-5.dat
  [1,16,-13,-4,18,0,-20,0,0,21,-15,10,0,0, ldraw_lib__box2_5(realsolid)],
// 1 16 17 -32 18 0 0 1 0 1 0 -1 0 0 stud2.dat
  [1,16,17,-32,18,0,0,1,0,1,0,-1,0,0, ldraw_lib__stud2(realsolid)],
];
module ldraw_lib__30079(step=0, col=false, unit=2/5, alt=false, line=0.2, solid=!$preview)
    makepoly(ldraw_lib__30079(solid), step=step, col=col, unit=unit, alt=alt, line=line, solid=solid);
ldraw_lib__30079(line=0.2);
